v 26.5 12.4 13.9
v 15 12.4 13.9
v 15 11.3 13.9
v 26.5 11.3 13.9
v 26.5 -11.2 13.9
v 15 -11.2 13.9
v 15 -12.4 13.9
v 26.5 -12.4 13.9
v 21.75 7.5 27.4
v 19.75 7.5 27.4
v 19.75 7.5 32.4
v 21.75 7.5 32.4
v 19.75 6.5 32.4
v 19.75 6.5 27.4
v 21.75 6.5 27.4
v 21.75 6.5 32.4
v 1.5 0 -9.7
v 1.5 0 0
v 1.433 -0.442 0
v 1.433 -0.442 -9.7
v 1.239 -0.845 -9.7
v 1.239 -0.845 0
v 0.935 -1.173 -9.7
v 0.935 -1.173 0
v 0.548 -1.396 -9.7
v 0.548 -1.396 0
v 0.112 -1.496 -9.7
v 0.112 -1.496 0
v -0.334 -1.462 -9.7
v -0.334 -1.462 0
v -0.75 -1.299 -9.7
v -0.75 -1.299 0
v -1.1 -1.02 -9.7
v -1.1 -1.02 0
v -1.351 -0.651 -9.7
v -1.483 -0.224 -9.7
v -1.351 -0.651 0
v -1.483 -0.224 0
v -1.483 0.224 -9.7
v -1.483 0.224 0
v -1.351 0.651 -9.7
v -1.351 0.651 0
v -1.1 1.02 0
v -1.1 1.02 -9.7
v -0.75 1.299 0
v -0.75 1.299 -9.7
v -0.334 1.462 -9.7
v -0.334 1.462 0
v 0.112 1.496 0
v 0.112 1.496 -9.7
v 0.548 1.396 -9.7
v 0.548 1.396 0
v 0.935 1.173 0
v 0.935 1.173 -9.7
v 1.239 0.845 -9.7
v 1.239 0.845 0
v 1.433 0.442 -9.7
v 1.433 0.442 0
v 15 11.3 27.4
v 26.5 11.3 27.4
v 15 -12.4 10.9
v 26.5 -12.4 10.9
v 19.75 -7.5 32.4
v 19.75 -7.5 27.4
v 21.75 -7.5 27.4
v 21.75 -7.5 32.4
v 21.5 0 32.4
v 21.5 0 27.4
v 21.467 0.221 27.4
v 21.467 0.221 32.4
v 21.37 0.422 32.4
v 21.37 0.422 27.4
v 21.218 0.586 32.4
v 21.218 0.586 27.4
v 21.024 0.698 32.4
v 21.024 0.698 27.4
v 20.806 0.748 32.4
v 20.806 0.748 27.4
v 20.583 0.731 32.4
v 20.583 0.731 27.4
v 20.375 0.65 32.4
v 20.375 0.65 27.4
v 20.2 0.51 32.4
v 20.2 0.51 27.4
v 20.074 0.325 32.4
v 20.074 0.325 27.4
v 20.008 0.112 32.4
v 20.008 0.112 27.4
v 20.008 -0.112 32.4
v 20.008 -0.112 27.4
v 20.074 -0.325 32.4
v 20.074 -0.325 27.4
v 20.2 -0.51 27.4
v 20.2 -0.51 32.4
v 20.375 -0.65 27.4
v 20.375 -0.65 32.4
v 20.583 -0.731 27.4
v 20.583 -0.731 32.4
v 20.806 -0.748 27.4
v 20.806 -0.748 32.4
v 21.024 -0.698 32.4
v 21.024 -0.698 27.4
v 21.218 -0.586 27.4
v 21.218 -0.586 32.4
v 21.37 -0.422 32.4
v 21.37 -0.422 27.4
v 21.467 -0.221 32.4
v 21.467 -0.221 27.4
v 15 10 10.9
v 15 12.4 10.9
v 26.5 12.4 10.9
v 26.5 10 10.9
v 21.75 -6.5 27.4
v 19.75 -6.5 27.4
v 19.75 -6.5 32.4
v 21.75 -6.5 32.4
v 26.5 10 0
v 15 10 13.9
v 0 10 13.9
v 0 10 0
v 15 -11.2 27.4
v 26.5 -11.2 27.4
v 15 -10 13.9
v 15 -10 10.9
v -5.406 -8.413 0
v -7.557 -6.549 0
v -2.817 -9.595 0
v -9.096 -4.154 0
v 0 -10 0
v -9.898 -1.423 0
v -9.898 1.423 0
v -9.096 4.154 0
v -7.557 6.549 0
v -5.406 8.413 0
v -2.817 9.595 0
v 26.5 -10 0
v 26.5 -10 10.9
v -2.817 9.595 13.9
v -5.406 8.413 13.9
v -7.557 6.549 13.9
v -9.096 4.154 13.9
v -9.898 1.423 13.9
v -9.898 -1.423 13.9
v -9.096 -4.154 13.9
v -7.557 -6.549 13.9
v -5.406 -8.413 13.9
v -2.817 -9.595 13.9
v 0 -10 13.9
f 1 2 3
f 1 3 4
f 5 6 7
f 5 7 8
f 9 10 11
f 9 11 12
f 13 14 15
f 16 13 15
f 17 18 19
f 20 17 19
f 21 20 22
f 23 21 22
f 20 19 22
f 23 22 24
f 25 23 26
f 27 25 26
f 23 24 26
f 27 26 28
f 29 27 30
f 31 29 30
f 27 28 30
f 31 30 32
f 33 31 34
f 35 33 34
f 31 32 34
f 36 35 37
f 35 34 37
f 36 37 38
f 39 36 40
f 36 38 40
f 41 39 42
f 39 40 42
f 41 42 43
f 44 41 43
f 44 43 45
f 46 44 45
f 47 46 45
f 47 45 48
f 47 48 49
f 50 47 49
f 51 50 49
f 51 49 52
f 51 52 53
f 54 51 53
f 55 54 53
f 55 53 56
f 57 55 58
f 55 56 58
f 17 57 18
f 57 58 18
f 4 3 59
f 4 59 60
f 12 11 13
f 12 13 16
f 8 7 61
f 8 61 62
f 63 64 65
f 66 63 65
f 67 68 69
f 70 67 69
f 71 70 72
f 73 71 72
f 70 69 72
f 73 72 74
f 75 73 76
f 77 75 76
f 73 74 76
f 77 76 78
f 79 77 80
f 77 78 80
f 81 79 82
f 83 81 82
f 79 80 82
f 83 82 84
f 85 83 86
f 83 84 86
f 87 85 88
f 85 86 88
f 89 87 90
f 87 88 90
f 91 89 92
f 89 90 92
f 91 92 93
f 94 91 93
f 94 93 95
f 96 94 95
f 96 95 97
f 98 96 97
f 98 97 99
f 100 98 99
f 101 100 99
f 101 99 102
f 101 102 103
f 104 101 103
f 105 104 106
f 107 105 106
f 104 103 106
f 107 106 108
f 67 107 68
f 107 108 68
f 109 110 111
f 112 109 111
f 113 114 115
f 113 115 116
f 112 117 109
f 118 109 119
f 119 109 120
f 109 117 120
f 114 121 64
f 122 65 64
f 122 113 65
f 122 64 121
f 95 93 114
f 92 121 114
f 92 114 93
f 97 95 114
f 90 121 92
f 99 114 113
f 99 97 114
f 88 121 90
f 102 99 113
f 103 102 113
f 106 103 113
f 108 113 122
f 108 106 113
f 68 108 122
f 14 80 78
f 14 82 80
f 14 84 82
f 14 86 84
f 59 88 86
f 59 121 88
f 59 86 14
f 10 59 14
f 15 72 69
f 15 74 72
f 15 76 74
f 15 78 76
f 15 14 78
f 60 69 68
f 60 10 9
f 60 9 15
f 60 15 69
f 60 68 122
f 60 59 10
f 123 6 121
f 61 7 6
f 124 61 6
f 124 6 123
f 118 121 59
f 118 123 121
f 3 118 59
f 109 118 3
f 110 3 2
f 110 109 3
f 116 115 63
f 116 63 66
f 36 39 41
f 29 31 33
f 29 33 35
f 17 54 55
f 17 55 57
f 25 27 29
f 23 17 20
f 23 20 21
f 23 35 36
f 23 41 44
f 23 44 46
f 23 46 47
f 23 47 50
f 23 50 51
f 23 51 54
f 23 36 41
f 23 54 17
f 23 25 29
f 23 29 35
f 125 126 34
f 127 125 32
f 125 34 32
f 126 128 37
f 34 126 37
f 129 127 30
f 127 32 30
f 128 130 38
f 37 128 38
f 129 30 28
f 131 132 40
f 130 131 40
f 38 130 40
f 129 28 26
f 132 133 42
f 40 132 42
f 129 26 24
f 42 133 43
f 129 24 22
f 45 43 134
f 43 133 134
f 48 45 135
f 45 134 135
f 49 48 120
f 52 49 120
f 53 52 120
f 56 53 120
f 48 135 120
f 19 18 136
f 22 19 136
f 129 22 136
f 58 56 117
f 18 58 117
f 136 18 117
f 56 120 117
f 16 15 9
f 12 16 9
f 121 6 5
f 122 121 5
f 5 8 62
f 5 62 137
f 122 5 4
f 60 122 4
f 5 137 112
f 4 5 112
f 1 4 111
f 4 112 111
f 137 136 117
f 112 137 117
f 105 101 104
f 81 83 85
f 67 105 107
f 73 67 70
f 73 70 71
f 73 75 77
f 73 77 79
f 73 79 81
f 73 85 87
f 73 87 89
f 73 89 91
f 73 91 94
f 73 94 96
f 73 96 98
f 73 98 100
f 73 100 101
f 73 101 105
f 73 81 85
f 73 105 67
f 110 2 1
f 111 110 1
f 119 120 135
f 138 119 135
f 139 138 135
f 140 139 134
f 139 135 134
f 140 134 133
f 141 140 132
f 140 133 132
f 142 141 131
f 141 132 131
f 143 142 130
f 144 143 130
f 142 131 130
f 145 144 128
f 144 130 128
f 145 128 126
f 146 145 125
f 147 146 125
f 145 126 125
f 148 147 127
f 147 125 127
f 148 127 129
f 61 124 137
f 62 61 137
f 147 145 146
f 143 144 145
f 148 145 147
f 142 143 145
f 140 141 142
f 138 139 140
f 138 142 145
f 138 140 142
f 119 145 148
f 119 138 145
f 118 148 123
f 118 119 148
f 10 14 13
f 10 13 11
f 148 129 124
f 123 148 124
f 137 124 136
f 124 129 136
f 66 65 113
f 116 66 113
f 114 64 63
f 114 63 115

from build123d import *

# Parameters (mm, degrees)
F1_DEPTH = 13.9
F2_R     = 1.5
F3_DEPTH = 9.7
F4_W     = 11.5
F4_H     = 2.4
F5_DEPTH = 3
F6_W     = 11.5
F6_H     = 22.5
F7_DEPTH = 13.5
F8_R     = 0.75
F8_W     = 2
F8_H     = 1
F9_DEPTH = 5


with BuildPart() as f1:
    # F0 (on Top) → F1 (new body)
    with BuildSketch(Plane.XY):
        with BuildLine():
            Line((26.5, 10), (0, 10))
            ThreePointArc((0, 10), (-10, 0), (0, -10))
            Line((0, -10), (26.5, -10))
            Line((26.5, -10), (26.5, 10))
        make_face()
    extrude(amount=F1_DEPTH)

    # F2 (on face) → F3 (join)
    with BuildSketch(Plane(origin=(0, 0, 0), x_dir=(1, 0, 0), z_dir=(0, 0, -1))):
        Circle(F2_R)
    extrude(amount=F3_DEPTH)

    # F4 (on face) → F5 (join)
    with BuildSketch(Plane.XY.offset(13.9)):
        with Locations((20.75, 11.2)):
            Rectangle(F4_W, F4_H)
        with Locations((20.75, -11.2)):
            Rectangle(F4_W, F4_H)
    extrude(amount=-F5_DEPTH)

    # F6 (on face) → F7 (join)
    with BuildSketch(Plane.XY.offset(13.9)):
        with Locations((20.75, 0.05)):
            Rectangle(F6_W, F6_H)
    extrude(amount=F7_DEPTH)

    # F8 (on face) → F9 (join)
    with BuildSketch(Plane.XY.offset(27.4)):
        with Locations((20.75, 0)):
            Circle(F8_R)
        with Locations((20.75, 7)):
            Rectangle(F8_W, F8_H)
        with Locations((20.75, -7)):
            Rectangle(F8_W, F8_H)
    extrude(amount=F9_DEPTH)


solid = f1.part
